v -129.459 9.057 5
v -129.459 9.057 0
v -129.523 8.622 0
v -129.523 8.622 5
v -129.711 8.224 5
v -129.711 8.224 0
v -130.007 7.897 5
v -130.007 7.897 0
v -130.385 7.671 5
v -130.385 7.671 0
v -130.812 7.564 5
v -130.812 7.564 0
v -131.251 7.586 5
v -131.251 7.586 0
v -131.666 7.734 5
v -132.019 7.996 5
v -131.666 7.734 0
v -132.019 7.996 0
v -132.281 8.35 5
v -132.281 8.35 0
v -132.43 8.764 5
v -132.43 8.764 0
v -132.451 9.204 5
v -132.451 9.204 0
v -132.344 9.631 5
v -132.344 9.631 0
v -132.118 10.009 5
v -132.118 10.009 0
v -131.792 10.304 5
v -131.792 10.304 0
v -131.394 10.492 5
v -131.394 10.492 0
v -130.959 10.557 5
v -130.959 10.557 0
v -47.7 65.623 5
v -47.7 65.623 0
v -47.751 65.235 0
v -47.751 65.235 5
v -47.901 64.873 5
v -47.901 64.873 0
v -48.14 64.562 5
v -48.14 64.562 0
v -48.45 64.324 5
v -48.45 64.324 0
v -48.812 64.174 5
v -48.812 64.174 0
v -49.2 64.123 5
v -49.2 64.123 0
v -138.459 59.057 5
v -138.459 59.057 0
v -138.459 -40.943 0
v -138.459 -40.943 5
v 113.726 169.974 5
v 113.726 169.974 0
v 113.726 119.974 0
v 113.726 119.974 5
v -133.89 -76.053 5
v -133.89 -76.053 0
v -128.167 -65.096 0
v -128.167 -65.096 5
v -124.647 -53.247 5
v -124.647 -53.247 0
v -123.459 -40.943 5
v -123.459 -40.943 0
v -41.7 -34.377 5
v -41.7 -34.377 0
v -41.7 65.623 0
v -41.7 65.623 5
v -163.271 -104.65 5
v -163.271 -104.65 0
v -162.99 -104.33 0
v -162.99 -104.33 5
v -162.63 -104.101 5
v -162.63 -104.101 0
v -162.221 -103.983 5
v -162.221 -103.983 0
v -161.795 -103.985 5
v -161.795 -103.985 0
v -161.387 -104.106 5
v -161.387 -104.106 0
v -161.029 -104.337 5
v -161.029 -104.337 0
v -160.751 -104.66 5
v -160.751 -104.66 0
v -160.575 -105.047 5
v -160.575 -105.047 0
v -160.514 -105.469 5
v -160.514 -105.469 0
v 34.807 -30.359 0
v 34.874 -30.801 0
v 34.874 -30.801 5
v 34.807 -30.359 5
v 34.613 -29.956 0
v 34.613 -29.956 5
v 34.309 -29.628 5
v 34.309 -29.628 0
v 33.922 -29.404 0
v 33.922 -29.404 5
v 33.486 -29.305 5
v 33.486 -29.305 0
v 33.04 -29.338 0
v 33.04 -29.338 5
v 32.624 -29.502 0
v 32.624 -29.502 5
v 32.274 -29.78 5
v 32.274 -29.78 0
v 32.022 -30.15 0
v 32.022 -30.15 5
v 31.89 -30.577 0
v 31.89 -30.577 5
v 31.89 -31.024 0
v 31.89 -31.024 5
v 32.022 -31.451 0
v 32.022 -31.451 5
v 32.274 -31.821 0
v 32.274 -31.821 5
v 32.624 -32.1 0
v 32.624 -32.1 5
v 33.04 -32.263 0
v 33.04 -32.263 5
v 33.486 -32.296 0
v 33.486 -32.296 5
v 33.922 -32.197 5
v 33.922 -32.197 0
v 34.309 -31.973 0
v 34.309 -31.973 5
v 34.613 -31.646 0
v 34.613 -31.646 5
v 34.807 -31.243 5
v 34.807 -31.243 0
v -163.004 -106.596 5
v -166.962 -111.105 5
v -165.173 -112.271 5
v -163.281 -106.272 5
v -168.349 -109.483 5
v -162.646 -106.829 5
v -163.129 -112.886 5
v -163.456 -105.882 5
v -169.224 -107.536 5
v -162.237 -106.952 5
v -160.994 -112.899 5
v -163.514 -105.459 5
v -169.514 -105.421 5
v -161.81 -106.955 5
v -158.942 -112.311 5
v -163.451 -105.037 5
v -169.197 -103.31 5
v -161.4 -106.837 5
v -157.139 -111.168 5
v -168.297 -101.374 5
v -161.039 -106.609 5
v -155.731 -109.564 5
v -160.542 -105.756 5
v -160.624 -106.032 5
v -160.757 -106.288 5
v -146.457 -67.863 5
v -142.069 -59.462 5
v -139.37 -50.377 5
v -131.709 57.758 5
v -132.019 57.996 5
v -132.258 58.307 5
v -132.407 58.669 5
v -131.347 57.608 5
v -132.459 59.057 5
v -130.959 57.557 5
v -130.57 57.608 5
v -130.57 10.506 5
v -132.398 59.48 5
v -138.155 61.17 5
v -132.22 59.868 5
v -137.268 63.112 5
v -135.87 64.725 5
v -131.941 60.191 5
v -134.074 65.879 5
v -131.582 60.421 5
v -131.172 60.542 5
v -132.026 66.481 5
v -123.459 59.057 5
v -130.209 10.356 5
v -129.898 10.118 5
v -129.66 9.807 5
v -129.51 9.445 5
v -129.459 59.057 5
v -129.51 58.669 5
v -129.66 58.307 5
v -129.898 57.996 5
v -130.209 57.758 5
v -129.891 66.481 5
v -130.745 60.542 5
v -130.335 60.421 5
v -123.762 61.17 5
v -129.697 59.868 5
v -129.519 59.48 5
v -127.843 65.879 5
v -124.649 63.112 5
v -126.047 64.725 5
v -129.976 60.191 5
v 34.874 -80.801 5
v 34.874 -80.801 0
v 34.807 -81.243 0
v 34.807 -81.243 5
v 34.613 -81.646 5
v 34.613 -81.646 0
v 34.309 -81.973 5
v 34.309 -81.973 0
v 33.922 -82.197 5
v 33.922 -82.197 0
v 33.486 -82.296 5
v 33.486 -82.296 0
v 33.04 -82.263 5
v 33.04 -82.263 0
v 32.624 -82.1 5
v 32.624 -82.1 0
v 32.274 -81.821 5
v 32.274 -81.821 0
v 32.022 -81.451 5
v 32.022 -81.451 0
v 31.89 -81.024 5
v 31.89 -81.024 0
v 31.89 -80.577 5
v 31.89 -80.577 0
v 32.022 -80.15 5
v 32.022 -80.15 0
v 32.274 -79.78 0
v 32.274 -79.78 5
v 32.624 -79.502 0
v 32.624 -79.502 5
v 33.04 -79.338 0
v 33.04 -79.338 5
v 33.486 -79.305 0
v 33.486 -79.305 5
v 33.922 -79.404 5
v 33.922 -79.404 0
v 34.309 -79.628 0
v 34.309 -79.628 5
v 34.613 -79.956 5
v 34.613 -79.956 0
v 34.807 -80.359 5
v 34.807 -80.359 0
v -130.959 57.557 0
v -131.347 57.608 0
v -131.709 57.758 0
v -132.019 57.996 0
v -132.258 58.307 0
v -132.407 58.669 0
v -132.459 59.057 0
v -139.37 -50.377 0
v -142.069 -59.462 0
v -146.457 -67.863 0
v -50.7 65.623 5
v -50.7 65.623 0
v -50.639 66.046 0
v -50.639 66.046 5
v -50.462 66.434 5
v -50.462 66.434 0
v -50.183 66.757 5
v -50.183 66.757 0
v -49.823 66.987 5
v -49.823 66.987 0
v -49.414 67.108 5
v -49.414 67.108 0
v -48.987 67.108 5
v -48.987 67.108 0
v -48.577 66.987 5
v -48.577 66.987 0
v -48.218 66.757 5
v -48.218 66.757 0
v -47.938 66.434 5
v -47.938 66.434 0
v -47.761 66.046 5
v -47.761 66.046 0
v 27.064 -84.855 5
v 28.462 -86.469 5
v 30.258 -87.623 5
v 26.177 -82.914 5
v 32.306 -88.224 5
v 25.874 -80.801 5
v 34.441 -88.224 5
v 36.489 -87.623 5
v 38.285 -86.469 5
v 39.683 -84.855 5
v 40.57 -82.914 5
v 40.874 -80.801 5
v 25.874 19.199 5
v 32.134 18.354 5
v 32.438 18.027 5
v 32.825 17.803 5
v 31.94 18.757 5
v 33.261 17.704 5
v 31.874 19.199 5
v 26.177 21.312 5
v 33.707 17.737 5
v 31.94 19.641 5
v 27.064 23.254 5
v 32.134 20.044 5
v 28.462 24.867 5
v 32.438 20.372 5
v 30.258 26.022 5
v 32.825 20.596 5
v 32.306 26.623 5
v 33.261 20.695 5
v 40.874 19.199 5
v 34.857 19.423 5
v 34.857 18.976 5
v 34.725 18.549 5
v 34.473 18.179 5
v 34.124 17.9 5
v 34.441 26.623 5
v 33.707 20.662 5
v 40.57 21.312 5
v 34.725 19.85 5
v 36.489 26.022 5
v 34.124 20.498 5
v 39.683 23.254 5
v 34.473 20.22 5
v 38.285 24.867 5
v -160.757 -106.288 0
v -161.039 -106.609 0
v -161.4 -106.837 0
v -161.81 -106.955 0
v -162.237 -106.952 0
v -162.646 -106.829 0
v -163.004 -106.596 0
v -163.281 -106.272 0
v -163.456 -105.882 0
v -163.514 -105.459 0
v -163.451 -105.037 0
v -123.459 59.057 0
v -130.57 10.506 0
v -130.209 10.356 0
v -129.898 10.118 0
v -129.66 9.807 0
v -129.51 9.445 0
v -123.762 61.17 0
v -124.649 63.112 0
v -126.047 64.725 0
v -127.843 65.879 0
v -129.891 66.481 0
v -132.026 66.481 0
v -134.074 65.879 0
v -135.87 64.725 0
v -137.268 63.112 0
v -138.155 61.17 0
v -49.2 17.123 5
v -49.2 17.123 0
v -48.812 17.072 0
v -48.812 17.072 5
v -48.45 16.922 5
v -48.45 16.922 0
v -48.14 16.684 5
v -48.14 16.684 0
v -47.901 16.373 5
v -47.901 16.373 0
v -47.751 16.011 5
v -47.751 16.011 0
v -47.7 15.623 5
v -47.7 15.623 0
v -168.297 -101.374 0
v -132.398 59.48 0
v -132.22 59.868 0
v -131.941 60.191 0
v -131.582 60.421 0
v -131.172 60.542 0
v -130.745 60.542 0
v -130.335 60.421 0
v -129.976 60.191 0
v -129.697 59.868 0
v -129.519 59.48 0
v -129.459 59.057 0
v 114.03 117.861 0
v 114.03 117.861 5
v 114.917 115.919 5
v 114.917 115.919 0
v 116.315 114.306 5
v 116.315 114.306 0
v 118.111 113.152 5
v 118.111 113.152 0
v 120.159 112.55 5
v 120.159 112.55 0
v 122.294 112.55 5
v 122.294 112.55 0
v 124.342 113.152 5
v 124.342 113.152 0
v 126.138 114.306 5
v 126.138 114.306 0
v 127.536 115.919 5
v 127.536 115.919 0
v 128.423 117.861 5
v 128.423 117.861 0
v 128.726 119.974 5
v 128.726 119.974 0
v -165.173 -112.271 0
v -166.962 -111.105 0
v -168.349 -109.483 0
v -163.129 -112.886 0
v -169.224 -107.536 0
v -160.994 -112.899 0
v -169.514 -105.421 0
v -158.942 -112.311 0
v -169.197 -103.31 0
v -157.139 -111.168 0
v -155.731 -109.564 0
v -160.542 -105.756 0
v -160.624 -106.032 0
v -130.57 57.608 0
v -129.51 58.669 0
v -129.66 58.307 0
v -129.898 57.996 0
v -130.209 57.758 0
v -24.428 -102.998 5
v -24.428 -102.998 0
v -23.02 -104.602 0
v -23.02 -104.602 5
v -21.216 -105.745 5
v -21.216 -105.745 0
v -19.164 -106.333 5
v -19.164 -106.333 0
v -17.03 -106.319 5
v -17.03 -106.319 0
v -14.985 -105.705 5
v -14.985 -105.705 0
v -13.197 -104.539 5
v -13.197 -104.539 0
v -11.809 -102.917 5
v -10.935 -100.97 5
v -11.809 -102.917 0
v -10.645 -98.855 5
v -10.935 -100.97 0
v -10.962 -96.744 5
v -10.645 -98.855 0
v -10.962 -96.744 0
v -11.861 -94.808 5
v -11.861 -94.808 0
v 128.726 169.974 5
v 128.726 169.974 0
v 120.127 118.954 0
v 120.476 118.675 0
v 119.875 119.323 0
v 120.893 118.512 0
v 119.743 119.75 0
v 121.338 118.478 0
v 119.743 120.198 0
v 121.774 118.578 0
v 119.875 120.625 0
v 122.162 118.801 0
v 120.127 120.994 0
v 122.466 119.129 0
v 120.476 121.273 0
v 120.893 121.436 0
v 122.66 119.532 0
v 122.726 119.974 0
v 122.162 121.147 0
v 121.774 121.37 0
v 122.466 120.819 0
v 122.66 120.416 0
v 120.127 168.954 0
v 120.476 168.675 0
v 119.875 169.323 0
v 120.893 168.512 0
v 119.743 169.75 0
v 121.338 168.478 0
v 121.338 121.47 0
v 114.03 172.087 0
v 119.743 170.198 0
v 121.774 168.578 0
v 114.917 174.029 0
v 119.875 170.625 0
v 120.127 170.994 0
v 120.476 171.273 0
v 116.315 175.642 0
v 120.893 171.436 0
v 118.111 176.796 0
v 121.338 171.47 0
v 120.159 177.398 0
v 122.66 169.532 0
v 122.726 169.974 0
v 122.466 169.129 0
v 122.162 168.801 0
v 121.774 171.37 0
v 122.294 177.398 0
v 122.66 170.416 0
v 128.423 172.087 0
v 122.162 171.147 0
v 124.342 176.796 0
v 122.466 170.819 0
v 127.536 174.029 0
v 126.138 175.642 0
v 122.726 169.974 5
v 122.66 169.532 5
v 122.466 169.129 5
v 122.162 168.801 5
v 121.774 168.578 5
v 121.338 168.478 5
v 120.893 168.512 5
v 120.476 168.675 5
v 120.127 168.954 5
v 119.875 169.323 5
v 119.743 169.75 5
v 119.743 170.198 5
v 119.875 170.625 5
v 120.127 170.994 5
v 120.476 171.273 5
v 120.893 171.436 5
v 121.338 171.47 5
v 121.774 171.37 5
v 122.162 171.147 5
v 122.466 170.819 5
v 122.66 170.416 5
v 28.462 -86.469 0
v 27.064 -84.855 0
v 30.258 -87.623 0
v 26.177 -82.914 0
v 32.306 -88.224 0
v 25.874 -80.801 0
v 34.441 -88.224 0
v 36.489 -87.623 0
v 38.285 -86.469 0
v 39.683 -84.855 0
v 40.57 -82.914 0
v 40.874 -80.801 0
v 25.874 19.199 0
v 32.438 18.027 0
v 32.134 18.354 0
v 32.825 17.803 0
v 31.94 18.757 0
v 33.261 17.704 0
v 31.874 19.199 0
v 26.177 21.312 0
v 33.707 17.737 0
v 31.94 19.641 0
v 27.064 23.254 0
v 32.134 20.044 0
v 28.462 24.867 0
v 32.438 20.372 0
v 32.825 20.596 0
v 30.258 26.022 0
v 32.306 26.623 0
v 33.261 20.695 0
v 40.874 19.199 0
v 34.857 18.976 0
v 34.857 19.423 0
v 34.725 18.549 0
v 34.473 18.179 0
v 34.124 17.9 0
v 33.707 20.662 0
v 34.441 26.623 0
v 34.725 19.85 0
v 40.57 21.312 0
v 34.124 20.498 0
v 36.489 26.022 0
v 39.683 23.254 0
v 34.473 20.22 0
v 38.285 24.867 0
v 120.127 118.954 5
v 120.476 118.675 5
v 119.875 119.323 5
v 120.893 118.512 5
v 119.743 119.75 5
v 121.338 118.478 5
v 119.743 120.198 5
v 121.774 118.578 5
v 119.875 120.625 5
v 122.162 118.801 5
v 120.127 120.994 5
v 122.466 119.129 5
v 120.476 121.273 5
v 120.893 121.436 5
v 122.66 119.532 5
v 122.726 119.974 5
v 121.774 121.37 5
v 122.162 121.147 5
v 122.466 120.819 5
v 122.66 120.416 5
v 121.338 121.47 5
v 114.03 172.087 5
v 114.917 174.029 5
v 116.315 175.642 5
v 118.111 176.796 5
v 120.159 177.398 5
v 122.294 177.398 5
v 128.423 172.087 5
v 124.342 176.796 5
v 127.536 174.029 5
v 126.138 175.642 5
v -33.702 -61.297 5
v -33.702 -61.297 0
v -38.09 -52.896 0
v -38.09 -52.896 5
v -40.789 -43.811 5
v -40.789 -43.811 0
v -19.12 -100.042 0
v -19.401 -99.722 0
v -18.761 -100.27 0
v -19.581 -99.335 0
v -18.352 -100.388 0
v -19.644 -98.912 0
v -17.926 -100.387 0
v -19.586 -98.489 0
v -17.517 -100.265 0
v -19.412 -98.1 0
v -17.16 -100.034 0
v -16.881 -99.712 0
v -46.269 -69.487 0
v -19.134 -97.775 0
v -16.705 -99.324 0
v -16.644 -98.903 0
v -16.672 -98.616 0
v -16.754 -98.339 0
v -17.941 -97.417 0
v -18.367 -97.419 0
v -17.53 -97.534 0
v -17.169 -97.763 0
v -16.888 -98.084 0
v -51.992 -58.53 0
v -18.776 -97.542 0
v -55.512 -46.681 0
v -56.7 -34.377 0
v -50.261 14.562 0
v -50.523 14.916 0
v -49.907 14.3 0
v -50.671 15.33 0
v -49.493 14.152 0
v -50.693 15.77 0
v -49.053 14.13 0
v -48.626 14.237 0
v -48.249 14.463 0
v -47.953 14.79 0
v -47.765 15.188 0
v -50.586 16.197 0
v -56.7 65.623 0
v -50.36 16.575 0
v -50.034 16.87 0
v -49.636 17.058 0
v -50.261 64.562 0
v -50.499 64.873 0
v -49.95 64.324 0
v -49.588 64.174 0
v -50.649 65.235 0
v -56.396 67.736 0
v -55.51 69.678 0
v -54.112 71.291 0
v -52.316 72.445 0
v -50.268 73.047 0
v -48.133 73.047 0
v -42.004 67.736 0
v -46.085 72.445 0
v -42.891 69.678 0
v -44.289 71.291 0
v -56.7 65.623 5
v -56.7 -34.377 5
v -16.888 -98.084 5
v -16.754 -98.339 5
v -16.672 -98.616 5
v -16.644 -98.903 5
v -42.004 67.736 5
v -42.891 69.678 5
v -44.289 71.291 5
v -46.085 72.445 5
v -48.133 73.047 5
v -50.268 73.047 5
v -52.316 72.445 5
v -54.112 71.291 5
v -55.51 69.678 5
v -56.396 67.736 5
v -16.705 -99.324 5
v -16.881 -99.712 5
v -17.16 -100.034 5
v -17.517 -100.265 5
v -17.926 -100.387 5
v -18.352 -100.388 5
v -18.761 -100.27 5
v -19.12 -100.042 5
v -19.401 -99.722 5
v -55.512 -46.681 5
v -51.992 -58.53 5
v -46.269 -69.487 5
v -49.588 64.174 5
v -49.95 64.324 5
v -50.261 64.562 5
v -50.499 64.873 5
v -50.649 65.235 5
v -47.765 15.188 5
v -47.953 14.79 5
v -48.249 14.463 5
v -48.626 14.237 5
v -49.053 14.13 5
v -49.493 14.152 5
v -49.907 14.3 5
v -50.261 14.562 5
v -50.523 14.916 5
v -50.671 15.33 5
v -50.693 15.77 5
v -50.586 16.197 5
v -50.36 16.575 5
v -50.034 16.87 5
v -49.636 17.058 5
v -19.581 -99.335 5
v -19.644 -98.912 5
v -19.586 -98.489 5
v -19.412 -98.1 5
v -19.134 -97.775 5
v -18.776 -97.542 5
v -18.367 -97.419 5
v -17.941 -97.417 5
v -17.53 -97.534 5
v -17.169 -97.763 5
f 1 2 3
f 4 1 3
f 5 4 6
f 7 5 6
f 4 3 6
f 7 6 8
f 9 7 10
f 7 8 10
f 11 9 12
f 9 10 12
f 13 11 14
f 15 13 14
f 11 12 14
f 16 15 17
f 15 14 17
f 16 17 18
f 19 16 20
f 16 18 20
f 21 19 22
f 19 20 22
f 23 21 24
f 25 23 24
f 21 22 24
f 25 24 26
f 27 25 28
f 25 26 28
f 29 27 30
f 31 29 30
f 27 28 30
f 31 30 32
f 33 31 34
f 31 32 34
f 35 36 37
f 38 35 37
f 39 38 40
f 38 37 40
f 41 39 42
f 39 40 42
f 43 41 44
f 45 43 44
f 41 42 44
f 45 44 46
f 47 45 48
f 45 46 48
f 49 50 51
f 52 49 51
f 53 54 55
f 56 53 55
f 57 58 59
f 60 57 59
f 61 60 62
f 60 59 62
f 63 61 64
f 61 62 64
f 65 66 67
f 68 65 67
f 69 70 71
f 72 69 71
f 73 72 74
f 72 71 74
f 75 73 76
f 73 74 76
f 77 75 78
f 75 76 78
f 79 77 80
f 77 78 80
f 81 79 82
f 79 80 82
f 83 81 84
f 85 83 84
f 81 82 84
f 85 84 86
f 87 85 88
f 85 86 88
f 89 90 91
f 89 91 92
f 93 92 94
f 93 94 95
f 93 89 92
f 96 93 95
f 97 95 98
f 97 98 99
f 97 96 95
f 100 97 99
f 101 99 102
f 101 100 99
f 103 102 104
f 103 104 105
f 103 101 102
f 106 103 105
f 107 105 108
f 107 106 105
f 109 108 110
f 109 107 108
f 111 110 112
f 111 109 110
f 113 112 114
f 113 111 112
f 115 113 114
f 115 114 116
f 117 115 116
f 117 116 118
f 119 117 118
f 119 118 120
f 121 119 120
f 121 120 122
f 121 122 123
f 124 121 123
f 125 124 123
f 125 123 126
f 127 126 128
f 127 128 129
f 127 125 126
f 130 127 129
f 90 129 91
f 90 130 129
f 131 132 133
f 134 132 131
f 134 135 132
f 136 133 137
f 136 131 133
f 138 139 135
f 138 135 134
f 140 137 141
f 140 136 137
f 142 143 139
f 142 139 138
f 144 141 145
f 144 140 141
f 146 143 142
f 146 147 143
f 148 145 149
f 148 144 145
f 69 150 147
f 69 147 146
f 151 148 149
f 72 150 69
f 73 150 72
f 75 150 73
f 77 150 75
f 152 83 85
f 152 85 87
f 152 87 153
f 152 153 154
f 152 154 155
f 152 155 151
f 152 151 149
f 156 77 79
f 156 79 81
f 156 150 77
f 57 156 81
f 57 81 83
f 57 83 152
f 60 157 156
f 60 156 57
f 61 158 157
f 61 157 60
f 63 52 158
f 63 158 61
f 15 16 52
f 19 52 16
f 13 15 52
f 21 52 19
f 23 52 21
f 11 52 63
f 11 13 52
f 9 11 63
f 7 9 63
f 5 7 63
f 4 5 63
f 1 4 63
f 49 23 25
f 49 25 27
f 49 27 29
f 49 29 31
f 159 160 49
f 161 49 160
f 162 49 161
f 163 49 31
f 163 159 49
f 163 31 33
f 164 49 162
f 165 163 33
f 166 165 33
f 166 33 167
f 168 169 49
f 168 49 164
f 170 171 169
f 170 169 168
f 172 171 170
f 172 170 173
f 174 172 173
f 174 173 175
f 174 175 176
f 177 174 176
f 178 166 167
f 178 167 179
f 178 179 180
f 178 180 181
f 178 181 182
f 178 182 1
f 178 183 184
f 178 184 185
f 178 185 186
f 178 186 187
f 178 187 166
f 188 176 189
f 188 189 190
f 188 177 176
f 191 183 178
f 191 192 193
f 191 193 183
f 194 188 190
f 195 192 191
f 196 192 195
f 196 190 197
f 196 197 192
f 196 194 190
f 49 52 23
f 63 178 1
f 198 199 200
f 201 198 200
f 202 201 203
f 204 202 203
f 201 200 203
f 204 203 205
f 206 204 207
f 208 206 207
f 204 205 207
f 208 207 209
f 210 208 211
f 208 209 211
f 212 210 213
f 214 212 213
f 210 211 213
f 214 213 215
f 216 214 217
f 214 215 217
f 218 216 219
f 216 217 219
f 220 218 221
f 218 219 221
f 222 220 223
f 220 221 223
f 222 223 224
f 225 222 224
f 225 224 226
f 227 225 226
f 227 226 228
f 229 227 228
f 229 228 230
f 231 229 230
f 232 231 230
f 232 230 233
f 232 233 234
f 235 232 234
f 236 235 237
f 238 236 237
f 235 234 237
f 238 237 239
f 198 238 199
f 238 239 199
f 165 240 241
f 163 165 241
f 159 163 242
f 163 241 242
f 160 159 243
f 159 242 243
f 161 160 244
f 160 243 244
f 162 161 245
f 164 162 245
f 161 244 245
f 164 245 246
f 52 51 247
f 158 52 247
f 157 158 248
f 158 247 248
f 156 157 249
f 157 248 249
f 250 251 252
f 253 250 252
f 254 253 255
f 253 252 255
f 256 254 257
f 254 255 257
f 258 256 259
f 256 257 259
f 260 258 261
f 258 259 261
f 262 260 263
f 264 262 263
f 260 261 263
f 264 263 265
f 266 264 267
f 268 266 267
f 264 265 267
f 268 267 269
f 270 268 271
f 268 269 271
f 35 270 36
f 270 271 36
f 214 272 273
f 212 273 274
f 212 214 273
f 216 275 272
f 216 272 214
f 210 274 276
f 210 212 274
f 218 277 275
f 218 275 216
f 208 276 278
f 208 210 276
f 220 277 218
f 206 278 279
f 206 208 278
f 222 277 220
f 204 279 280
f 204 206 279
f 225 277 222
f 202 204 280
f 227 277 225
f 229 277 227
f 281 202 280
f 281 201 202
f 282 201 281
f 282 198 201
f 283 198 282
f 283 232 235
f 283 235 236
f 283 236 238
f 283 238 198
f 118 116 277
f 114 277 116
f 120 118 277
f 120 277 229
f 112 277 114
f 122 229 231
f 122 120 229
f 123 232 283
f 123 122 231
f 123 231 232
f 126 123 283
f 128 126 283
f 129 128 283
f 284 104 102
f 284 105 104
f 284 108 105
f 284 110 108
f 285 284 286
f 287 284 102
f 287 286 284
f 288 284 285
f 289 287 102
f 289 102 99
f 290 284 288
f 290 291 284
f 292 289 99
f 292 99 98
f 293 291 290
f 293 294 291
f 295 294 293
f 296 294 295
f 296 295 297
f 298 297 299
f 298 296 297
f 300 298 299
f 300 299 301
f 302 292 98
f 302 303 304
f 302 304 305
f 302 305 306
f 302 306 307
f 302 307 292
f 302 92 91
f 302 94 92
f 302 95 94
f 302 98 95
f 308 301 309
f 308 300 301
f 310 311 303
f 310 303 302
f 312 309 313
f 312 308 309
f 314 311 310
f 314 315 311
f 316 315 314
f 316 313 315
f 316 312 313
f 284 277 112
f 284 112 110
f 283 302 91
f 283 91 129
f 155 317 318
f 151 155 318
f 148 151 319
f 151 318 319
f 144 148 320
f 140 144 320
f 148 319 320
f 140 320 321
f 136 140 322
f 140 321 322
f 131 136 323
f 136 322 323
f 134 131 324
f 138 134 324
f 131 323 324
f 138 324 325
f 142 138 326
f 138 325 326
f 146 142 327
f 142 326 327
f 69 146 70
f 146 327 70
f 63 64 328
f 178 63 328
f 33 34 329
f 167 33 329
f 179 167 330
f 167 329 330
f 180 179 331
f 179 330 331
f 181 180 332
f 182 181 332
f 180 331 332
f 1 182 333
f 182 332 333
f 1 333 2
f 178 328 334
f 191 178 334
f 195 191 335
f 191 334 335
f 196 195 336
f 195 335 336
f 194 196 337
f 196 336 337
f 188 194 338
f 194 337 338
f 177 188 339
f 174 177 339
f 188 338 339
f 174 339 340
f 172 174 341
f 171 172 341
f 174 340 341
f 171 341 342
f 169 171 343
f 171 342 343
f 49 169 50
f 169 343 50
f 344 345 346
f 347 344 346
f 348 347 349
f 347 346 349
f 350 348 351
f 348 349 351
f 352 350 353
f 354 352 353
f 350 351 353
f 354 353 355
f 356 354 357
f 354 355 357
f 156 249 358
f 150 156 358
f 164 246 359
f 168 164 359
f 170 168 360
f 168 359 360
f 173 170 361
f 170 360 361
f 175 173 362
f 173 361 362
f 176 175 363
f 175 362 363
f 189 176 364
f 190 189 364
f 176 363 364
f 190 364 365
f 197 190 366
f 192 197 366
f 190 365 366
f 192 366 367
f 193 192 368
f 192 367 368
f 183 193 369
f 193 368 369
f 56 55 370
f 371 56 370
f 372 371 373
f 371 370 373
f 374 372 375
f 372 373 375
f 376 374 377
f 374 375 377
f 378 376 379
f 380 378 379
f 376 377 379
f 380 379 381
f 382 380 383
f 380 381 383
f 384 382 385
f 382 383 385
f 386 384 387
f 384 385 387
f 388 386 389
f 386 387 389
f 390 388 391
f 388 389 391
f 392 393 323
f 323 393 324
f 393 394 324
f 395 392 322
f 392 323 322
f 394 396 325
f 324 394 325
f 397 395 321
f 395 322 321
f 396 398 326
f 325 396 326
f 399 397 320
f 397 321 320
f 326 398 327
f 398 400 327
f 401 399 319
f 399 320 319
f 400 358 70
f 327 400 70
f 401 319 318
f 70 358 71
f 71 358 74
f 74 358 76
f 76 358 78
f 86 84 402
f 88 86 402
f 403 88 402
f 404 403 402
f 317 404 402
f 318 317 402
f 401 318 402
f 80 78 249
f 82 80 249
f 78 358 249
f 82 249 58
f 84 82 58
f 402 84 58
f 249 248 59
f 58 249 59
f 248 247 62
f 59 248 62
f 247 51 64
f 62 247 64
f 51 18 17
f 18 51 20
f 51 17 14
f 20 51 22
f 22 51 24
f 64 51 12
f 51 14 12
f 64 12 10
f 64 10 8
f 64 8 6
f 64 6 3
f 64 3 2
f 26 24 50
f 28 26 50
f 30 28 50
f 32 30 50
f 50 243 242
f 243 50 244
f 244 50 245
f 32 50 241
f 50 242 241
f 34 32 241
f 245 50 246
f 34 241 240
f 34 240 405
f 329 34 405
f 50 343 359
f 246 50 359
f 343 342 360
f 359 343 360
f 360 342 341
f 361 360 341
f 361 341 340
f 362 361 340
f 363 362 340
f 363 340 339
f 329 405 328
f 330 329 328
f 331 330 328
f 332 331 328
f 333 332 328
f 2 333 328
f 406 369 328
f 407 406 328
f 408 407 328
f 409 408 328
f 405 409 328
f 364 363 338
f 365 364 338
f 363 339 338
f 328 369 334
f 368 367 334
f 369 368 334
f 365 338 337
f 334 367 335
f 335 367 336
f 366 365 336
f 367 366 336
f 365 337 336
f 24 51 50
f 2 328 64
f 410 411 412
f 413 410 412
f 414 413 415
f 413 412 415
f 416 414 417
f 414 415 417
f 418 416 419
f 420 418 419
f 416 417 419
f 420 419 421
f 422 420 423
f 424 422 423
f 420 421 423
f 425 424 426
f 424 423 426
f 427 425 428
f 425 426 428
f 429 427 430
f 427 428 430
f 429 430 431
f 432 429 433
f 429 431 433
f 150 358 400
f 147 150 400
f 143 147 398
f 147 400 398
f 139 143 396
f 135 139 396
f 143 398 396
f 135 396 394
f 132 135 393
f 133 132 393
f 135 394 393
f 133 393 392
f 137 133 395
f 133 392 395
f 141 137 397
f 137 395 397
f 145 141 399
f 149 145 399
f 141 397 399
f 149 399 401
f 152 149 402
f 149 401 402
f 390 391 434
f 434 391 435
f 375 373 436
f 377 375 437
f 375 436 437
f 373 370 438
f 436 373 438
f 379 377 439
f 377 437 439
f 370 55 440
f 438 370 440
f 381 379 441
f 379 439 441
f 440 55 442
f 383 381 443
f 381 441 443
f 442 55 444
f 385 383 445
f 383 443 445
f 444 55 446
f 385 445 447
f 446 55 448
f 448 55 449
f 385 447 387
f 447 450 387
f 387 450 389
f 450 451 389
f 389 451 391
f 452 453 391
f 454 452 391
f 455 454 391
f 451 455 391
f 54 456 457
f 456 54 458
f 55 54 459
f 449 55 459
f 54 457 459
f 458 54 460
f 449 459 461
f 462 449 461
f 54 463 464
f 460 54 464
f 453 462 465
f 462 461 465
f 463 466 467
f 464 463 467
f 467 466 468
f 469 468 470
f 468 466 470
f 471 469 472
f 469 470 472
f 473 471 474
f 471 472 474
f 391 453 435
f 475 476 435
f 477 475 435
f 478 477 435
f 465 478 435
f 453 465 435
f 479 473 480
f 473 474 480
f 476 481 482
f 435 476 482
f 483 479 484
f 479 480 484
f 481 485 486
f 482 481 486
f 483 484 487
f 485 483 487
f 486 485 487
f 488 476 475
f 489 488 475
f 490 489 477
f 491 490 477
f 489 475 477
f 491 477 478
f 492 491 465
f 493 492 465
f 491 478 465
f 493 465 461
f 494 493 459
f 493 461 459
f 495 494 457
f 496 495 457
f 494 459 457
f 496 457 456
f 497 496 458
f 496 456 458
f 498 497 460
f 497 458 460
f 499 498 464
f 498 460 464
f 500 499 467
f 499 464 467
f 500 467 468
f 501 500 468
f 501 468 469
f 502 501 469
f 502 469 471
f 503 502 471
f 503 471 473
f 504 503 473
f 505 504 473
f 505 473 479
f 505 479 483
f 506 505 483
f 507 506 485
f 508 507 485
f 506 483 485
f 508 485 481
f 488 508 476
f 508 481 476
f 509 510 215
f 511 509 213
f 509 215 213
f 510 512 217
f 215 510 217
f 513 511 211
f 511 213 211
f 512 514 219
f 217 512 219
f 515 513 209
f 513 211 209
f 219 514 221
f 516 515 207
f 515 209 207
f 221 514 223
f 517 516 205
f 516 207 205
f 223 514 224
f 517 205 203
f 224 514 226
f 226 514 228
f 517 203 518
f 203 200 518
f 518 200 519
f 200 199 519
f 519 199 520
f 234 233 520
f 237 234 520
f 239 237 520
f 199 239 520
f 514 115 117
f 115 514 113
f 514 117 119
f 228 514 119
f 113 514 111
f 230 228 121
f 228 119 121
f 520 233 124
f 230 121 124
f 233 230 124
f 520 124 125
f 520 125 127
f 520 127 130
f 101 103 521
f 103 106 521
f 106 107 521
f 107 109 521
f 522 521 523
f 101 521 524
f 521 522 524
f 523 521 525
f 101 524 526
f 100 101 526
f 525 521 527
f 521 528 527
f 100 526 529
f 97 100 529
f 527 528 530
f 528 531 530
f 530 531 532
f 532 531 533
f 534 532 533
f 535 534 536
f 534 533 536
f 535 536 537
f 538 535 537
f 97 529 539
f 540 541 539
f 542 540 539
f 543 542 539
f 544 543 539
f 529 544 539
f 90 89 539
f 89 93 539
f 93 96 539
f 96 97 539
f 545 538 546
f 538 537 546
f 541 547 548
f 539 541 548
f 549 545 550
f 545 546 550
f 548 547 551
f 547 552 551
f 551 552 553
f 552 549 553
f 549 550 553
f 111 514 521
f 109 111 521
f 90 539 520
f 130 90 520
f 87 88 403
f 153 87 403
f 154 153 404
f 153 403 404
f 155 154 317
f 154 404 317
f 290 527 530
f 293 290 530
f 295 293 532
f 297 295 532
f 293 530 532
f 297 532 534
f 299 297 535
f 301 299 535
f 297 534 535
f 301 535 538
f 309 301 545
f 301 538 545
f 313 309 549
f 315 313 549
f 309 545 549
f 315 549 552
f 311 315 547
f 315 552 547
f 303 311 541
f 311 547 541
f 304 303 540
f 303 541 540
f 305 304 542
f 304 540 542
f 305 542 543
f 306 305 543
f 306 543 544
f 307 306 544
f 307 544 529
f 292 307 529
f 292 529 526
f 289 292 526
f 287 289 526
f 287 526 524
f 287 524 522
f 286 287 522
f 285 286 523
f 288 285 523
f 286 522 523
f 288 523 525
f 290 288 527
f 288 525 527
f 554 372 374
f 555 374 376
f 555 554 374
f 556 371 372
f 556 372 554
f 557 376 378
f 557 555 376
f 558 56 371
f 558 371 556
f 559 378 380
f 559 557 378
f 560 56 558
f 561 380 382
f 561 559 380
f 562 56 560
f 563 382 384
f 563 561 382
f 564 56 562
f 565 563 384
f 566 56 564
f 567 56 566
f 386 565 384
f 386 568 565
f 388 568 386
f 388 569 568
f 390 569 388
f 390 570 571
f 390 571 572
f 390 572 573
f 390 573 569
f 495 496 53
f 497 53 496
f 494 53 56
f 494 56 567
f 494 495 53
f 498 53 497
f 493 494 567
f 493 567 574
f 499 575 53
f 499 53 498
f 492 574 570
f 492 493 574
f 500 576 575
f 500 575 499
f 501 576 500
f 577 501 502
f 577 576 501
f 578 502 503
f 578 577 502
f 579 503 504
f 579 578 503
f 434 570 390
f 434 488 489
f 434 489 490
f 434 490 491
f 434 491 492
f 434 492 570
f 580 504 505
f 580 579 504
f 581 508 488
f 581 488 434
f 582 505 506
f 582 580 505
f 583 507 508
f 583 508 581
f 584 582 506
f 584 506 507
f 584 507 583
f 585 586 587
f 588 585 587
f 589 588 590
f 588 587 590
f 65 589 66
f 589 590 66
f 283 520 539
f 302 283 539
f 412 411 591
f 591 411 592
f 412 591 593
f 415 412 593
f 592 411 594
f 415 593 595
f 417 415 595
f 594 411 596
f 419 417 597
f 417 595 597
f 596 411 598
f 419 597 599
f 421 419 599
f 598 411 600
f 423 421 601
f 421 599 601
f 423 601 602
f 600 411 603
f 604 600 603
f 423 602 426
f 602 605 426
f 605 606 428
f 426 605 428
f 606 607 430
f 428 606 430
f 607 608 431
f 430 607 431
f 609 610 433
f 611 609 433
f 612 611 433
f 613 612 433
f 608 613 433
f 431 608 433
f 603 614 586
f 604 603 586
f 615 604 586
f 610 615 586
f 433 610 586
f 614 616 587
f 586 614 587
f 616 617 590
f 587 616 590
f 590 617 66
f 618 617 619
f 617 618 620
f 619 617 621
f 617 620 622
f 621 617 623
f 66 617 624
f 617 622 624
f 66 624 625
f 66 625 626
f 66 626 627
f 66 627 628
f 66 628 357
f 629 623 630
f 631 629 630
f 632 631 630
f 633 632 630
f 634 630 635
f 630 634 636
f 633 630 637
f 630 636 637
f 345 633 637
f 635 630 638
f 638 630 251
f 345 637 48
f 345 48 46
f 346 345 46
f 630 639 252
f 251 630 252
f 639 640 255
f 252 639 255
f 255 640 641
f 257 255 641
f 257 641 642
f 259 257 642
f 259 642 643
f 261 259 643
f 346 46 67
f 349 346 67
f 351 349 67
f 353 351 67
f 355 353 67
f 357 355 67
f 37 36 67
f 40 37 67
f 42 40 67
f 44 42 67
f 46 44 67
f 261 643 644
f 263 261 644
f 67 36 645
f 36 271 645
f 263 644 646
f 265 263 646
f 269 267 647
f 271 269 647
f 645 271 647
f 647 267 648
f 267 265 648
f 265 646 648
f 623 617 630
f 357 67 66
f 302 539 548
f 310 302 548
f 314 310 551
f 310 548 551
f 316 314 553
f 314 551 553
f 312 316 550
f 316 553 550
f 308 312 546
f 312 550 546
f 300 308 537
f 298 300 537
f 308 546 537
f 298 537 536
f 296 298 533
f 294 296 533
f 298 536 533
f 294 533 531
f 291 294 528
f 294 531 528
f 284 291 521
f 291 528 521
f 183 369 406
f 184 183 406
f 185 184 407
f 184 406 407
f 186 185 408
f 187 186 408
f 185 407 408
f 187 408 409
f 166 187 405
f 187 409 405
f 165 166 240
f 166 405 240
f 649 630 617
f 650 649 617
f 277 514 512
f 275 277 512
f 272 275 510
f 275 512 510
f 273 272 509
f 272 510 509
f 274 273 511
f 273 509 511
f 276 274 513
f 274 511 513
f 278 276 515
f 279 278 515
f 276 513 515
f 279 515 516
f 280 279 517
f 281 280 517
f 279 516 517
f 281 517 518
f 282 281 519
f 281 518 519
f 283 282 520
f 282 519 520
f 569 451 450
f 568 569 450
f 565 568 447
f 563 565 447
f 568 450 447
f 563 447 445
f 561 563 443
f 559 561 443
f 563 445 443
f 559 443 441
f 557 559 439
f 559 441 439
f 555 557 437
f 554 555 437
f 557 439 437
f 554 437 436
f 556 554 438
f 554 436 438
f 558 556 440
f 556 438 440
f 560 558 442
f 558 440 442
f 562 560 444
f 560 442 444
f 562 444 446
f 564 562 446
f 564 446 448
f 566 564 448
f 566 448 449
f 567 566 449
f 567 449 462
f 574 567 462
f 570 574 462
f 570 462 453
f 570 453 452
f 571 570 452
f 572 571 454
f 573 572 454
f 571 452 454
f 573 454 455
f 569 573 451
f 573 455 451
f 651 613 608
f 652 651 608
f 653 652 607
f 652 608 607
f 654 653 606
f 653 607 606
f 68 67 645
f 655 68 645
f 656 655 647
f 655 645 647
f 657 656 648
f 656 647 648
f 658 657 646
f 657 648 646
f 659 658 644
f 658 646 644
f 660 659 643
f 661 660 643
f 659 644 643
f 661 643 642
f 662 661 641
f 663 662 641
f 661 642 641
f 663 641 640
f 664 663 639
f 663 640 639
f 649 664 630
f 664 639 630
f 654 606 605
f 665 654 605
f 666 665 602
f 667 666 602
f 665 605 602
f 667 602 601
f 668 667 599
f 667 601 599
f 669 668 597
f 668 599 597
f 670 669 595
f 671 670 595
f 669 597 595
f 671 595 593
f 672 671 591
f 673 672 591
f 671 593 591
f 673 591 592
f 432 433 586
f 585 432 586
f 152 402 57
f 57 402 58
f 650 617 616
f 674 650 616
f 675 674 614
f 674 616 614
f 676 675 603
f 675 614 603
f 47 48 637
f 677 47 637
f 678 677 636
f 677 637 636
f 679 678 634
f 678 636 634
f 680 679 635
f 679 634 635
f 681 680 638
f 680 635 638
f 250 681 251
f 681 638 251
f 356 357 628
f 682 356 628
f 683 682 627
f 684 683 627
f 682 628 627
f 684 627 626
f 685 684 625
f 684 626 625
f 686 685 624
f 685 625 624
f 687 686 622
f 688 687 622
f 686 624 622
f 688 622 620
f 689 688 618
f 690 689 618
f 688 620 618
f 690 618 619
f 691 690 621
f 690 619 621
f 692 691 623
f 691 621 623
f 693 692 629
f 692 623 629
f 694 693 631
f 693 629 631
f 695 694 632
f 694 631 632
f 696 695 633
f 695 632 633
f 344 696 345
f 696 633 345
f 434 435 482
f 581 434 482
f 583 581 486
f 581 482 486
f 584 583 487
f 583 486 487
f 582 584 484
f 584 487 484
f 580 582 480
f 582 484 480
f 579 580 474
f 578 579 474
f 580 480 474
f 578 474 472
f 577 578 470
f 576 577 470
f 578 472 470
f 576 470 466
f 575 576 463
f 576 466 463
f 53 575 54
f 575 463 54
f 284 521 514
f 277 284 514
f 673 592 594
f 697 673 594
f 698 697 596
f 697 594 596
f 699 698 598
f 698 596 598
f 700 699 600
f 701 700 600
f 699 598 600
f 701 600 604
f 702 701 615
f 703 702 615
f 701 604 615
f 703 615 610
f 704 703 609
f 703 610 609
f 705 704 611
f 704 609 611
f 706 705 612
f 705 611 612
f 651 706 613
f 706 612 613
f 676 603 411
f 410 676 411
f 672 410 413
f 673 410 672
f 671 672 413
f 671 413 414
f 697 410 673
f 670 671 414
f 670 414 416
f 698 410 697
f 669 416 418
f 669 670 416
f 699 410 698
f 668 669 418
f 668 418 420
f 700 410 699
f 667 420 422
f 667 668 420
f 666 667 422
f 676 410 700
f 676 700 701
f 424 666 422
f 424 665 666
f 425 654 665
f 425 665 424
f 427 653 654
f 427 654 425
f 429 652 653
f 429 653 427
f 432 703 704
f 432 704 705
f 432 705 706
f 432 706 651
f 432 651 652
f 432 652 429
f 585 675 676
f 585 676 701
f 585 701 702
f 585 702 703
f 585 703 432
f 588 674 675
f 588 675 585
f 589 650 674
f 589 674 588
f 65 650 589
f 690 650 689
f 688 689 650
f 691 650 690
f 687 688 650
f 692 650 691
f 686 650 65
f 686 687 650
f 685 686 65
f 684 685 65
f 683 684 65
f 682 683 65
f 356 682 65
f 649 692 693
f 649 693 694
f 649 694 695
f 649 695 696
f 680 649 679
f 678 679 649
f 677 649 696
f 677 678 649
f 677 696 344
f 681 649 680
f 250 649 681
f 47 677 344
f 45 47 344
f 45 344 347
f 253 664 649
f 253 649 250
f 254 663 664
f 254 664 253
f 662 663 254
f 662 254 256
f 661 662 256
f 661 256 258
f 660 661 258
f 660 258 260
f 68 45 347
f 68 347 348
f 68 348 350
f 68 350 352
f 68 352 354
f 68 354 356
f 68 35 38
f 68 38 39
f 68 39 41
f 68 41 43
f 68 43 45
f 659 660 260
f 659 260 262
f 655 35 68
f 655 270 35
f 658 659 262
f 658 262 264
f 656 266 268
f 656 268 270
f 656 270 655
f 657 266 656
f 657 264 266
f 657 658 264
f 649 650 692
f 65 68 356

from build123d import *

# Parameters (mm, degrees)
F0_R     = 1.5
F1_DEPTH = 5
F3_DEPTH = 5
F4_DEPTH = 5
F6_DEPTH = 5


with BuildPart() as f1:
    # F0 (on Top) → F1 (new body)
    with BuildSketch(Plane.XY):
        with BuildLine():
            Line((31.873505, 19.199338), (25.873505, 19.199338))
            Line((25.873505, 19.199338), (25.873505, -80.800662))
            Line((25.873505, -80.800662), (31.873505, -80.800662))
            ThreePointArc((31.873505, -80.800662), (33.373505, -79.300662), (34.873505, -80.800662))
            Line((34.873505, -80.800662), (40.873505, -80.800662))
            Line((40.873505, -80.800662), (40.873505, 19.199338))
            Line((40.873505, 19.199338), (34.873505, 19.199338))
            ThreePointArc((34.873505, 19.199338), (33.373505, 17.699338), (31.873505, 19.199338))
        make_face()
        with Locations((33.373505, -30.800662)):
            Circle(F0_R, mode=Mode.SUBTRACT)
        with BuildLine():
            ThreePointArc((40.873505, 19.199338), (33.373505, 26.699338), (25.873505, 19.199338))
            Line((25.873505, 19.199338), (31.873505, 19.199338))
            ThreePointArc((31.873505, 19.199338), (33.373505, 20.699338), (34.873505, 19.199338))
            Line((34.873505, 19.199338), (40.873505, 19.199338))
        make_face()
        with BuildLine():
            Line((31.873505, -80.800662), (25.873505, -80.800662))
            ThreePointArc((25.873505, -80.800662), (33.373505, -88.300662), (40.873505, -80.800662))
            Line((40.873505, -80.800662), (34.873505, -80.800662))
            ThreePointArc((34.873505, -80.800662), (33.373505, -82.300662), (31.873505, -80.800662))
        make_face()
    extrude(amount=F1_DEPTH)


with BuildPart() as f3:
    # F2 (on Top) → F3 (new body)
    with BuildSketch(Plane.XY):
        with BuildLine():
            ThreePointArc((-41.700259, 65.622939), (-49.200259, 73.122939), (-56.700259, 65.622939))
            Line((-56.700259, 65.622939), (-50.700259, 65.622939))
            ThreePointArc((-50.700259, 65.622939), (-49.200259, 67.122939), (-47.700259, 65.622939))
            Line((-47.700259, 65.622939), (-41.700259, 65.622939))
        make_face()
        with BuildLine():
            Line((-50.700259, 65.622939), (-56.700259, 65.622939))
            Line((-56.700259, 65.622939), (-56.700259, -34.377061))
            Line((-56.700259, -34.377061), (-41.700259, -34.377061))
            Line((-41.700259, -34.377061), (-41.700259, 65.622939))
            Line((-41.700259, 65.622939), (-47.700259, 65.622939))
            ThreePointArc((-47.700259, 65.622939), (-48.139599, 64.562279), (-49.200259, 64.122939))
            ThreePointArc((-49.200259, 64.122939), (-50.26092, 64.562279), (-50.700259, 65.622939))
        make_face()
        with BuildLine():
            ThreePointArc((-47.700259, 15.622939), (-50.26092, 14.562279), (-49.200259, 17.122939))
            ThreePointArc((-49.200259, 17.122939), (-48.139599, 16.683599), (-47.700259, 15.622939))
        make_face(mode=Mode.SUBTRACT)
        with BuildLine():
            Line((-41.700259, -34.377061), (-56.700259, -34.377061))
            ThreePointArc((-56.700259, -34.377061), (-54.037216, -52.690552), (-46.268664, -69.48714))
            Line((-46.268664, -69.48714), (-33.702103, -61.296807))
            ThreePointArc((-33.702103, -61.296807), (-39.658439, -48.418457), (-41.700259, -34.377061))
        make_face()
        with BuildLine():
            Line((-33.702103, -61.296807), (-46.268664, -69.48714))
            Line((-46.268664, -69.48714), (-24.427779, -102.997969))
            Line((-24.427779, -102.997969), (-19.401154, -99.721836))
            ThreePointArc((-19.401154, -99.721836), (-18.963531, -97.646147), (-16.887842, -98.08377))
            Line((-16.887842, -98.08377), (-11.861217, -94.807637))
            Line((-11.861217, -94.807637), (-33.702103, -61.296807))
        make_face()
        with BuildLine():
            Line((-19.401154, -99.721836), (-24.427779, -102.997969))
            ThreePointArc((-24.427779, -102.997969), (-14.049332, -105.186084), (-11.861217, -94.807637))
            Line((-11.861217, -94.807637), (-16.887842, -98.08377))
            ThreePointArc((-16.887842, -98.08377), (-16.70662, -98.475594), (-16.644498, -98.902803))
            ThreePointArc((-16.644498, -98.902803), (-17.717289, -100.340681), (-19.401154, -99.721836))
        make_face()
    extrude(amount=F3_DEPTH)


with BuildPart() as f4:
    # F2 (on Top) → F4 (new body)
    with BuildSketch(Plane.XY):
        with BuildLine():
            Line((-129.458595, 59.056929), (-123.458595, 59.056929))
            ThreePointArc((-123.458595, 59.056929), (-130.958595, 66.556929), (-138.458595, 59.056929))
            Line((-138.458595, 59.056929), (-132.458595, 59.056929))
            ThreePointArc((-132.458595, 59.056929), (-130.958595, 60.556929), (-129.458595, 59.056929))
        make_face()
        with BuildLine():
            Line((-123.458595, -40.943071), (-123.458595, 59.056929))
            Line((-123.458595, 59.056929), (-129.458595, 59.056929))
            ThreePointArc((-129.458595, 59.056929), (-129.897935, 57.996268), (-130.958595, 57.556929))
            ThreePointArc((-130.958595, 57.556929), (-132.019255, 57.996268), (-132.458595, 59.056929))
            Line((-132.458595, 59.056929), (-138.458595, 59.056929))
            Line((-138.458595, 59.056929), (-138.458595, -40.943071))
            Line((-138.458595, -40.943071), (-123.458595, -40.943071))
        make_face()
        with BuildLine():
            ThreePointArc((-129.458595, 9.056929), (-132.019255, 7.996268), (-130.958595, 10.556929))
            ThreePointArc((-130.958595, 10.556929), (-129.897935, 10.117589), (-129.458595, 9.056929))
        make_face(mode=Mode.SUBTRACT)
        with BuildLine():
            ThreePointArc((-133.890106, -76.05315), (-126.121616, -59.25655), (-123.458595, -40.943071))
            Line((-123.458595, -40.943071), (-138.458595, -40.943071))
            ThreePointArc((-138.458595, -40.943071), (-140.500402, -54.984488), (-146.456703, -67.862873))
            Line((-146.456703, -67.862873), (-133.890106, -76.05315))
        make_face()
        with BuildLine():
            Line((-155.730844, -109.564076), (-133.890106, -76.05315))
            Line((-133.890106, -76.05315), (-146.456703, -67.862873))
            Line((-146.456703, -67.862873), (-168.297441, -101.373799))
            Line((-168.297441, -101.373799), (-163.270802, -104.64991))
            ThreePointArc((-163.270802, -104.64991), (-161.586936, -104.031059), (-160.514142, -105.468938))
            ThreePointArc((-160.514142, -105.468938), (-160.576264, -105.896144), (-160.757483, -106.287965))
            Line((-160.757483, -106.287965), (-155.730844, -109.564076))
        make_face()
        with BuildLine():
            ThreePointArc((-168.297441, -101.373799), (-166.109281, -111.752236), (-155.730844, -109.564076))
            Line((-155.730844, -109.564076), (-160.757483, -106.287965))
            ThreePointArc((-160.757483, -106.287965), (-162.83317, -106.725597), (-163.270802, -104.64991))
            Line((-163.270802, -104.64991), (-168.297441, -101.373799))
        make_face()
    extrude(amount=F4_DEPTH)


with BuildPart() as f6:
    # F5 (on Top) → F6 (new body)
    with BuildSketch(Plane.XY):
        with BuildLine():
            ThreePointArc((128.72631, 169.97406), (121.22631, 177.47406), (113.72631, 169.97406))
            Line((113.72631, 169.97406), (119.72631, 169.97406))
            ThreePointArc((119.72631, 169.97406), (121.22631, 171.47406), (122.72631, 169.97406))
            Line((122.72631, 169.97406), (128.72631, 169.97406))
        make_face()
        with BuildLine():
            Line((119.72631, 169.97406), (113.72631, 169.97406))
            Line((113.72631, 169.97406), (113.72631, 119.97406))
            Line((113.72631, 119.97406), (119.72631, 119.97406))
            ThreePointArc((119.72631, 119.97406), (121.22631, 121.47406), (122.72631, 119.97406))
            Line((122.72631, 119.97406), (128.72631, 119.97406))
            Line((128.72631, 119.97406), (128.72631, 169.97406))
            Line((128.72631, 169.97406), (122.72631, 169.97406))
            ThreePointArc((122.72631, 169.97406), (121.22631, 168.47406), (119.72631, 169.97406))
        make_face()
        with BuildLine():
            Line((119.72631, 119.97406), (113.72631, 119.97406))
            ThreePointArc((113.72631, 119.97406), (121.22631, 112.47406), (128.72631, 119.97406))
            Line((128.72631, 119.97406), (122.72631, 119.97406))
            ThreePointArc((122.72631, 119.97406), (121.22631, 118.47406), (119.72631, 119.97406))
        make_face()
    extrude(amount=F6_DEPTH)


solid = Compound([f1.part, f3.part, f4.part, f6.part])
